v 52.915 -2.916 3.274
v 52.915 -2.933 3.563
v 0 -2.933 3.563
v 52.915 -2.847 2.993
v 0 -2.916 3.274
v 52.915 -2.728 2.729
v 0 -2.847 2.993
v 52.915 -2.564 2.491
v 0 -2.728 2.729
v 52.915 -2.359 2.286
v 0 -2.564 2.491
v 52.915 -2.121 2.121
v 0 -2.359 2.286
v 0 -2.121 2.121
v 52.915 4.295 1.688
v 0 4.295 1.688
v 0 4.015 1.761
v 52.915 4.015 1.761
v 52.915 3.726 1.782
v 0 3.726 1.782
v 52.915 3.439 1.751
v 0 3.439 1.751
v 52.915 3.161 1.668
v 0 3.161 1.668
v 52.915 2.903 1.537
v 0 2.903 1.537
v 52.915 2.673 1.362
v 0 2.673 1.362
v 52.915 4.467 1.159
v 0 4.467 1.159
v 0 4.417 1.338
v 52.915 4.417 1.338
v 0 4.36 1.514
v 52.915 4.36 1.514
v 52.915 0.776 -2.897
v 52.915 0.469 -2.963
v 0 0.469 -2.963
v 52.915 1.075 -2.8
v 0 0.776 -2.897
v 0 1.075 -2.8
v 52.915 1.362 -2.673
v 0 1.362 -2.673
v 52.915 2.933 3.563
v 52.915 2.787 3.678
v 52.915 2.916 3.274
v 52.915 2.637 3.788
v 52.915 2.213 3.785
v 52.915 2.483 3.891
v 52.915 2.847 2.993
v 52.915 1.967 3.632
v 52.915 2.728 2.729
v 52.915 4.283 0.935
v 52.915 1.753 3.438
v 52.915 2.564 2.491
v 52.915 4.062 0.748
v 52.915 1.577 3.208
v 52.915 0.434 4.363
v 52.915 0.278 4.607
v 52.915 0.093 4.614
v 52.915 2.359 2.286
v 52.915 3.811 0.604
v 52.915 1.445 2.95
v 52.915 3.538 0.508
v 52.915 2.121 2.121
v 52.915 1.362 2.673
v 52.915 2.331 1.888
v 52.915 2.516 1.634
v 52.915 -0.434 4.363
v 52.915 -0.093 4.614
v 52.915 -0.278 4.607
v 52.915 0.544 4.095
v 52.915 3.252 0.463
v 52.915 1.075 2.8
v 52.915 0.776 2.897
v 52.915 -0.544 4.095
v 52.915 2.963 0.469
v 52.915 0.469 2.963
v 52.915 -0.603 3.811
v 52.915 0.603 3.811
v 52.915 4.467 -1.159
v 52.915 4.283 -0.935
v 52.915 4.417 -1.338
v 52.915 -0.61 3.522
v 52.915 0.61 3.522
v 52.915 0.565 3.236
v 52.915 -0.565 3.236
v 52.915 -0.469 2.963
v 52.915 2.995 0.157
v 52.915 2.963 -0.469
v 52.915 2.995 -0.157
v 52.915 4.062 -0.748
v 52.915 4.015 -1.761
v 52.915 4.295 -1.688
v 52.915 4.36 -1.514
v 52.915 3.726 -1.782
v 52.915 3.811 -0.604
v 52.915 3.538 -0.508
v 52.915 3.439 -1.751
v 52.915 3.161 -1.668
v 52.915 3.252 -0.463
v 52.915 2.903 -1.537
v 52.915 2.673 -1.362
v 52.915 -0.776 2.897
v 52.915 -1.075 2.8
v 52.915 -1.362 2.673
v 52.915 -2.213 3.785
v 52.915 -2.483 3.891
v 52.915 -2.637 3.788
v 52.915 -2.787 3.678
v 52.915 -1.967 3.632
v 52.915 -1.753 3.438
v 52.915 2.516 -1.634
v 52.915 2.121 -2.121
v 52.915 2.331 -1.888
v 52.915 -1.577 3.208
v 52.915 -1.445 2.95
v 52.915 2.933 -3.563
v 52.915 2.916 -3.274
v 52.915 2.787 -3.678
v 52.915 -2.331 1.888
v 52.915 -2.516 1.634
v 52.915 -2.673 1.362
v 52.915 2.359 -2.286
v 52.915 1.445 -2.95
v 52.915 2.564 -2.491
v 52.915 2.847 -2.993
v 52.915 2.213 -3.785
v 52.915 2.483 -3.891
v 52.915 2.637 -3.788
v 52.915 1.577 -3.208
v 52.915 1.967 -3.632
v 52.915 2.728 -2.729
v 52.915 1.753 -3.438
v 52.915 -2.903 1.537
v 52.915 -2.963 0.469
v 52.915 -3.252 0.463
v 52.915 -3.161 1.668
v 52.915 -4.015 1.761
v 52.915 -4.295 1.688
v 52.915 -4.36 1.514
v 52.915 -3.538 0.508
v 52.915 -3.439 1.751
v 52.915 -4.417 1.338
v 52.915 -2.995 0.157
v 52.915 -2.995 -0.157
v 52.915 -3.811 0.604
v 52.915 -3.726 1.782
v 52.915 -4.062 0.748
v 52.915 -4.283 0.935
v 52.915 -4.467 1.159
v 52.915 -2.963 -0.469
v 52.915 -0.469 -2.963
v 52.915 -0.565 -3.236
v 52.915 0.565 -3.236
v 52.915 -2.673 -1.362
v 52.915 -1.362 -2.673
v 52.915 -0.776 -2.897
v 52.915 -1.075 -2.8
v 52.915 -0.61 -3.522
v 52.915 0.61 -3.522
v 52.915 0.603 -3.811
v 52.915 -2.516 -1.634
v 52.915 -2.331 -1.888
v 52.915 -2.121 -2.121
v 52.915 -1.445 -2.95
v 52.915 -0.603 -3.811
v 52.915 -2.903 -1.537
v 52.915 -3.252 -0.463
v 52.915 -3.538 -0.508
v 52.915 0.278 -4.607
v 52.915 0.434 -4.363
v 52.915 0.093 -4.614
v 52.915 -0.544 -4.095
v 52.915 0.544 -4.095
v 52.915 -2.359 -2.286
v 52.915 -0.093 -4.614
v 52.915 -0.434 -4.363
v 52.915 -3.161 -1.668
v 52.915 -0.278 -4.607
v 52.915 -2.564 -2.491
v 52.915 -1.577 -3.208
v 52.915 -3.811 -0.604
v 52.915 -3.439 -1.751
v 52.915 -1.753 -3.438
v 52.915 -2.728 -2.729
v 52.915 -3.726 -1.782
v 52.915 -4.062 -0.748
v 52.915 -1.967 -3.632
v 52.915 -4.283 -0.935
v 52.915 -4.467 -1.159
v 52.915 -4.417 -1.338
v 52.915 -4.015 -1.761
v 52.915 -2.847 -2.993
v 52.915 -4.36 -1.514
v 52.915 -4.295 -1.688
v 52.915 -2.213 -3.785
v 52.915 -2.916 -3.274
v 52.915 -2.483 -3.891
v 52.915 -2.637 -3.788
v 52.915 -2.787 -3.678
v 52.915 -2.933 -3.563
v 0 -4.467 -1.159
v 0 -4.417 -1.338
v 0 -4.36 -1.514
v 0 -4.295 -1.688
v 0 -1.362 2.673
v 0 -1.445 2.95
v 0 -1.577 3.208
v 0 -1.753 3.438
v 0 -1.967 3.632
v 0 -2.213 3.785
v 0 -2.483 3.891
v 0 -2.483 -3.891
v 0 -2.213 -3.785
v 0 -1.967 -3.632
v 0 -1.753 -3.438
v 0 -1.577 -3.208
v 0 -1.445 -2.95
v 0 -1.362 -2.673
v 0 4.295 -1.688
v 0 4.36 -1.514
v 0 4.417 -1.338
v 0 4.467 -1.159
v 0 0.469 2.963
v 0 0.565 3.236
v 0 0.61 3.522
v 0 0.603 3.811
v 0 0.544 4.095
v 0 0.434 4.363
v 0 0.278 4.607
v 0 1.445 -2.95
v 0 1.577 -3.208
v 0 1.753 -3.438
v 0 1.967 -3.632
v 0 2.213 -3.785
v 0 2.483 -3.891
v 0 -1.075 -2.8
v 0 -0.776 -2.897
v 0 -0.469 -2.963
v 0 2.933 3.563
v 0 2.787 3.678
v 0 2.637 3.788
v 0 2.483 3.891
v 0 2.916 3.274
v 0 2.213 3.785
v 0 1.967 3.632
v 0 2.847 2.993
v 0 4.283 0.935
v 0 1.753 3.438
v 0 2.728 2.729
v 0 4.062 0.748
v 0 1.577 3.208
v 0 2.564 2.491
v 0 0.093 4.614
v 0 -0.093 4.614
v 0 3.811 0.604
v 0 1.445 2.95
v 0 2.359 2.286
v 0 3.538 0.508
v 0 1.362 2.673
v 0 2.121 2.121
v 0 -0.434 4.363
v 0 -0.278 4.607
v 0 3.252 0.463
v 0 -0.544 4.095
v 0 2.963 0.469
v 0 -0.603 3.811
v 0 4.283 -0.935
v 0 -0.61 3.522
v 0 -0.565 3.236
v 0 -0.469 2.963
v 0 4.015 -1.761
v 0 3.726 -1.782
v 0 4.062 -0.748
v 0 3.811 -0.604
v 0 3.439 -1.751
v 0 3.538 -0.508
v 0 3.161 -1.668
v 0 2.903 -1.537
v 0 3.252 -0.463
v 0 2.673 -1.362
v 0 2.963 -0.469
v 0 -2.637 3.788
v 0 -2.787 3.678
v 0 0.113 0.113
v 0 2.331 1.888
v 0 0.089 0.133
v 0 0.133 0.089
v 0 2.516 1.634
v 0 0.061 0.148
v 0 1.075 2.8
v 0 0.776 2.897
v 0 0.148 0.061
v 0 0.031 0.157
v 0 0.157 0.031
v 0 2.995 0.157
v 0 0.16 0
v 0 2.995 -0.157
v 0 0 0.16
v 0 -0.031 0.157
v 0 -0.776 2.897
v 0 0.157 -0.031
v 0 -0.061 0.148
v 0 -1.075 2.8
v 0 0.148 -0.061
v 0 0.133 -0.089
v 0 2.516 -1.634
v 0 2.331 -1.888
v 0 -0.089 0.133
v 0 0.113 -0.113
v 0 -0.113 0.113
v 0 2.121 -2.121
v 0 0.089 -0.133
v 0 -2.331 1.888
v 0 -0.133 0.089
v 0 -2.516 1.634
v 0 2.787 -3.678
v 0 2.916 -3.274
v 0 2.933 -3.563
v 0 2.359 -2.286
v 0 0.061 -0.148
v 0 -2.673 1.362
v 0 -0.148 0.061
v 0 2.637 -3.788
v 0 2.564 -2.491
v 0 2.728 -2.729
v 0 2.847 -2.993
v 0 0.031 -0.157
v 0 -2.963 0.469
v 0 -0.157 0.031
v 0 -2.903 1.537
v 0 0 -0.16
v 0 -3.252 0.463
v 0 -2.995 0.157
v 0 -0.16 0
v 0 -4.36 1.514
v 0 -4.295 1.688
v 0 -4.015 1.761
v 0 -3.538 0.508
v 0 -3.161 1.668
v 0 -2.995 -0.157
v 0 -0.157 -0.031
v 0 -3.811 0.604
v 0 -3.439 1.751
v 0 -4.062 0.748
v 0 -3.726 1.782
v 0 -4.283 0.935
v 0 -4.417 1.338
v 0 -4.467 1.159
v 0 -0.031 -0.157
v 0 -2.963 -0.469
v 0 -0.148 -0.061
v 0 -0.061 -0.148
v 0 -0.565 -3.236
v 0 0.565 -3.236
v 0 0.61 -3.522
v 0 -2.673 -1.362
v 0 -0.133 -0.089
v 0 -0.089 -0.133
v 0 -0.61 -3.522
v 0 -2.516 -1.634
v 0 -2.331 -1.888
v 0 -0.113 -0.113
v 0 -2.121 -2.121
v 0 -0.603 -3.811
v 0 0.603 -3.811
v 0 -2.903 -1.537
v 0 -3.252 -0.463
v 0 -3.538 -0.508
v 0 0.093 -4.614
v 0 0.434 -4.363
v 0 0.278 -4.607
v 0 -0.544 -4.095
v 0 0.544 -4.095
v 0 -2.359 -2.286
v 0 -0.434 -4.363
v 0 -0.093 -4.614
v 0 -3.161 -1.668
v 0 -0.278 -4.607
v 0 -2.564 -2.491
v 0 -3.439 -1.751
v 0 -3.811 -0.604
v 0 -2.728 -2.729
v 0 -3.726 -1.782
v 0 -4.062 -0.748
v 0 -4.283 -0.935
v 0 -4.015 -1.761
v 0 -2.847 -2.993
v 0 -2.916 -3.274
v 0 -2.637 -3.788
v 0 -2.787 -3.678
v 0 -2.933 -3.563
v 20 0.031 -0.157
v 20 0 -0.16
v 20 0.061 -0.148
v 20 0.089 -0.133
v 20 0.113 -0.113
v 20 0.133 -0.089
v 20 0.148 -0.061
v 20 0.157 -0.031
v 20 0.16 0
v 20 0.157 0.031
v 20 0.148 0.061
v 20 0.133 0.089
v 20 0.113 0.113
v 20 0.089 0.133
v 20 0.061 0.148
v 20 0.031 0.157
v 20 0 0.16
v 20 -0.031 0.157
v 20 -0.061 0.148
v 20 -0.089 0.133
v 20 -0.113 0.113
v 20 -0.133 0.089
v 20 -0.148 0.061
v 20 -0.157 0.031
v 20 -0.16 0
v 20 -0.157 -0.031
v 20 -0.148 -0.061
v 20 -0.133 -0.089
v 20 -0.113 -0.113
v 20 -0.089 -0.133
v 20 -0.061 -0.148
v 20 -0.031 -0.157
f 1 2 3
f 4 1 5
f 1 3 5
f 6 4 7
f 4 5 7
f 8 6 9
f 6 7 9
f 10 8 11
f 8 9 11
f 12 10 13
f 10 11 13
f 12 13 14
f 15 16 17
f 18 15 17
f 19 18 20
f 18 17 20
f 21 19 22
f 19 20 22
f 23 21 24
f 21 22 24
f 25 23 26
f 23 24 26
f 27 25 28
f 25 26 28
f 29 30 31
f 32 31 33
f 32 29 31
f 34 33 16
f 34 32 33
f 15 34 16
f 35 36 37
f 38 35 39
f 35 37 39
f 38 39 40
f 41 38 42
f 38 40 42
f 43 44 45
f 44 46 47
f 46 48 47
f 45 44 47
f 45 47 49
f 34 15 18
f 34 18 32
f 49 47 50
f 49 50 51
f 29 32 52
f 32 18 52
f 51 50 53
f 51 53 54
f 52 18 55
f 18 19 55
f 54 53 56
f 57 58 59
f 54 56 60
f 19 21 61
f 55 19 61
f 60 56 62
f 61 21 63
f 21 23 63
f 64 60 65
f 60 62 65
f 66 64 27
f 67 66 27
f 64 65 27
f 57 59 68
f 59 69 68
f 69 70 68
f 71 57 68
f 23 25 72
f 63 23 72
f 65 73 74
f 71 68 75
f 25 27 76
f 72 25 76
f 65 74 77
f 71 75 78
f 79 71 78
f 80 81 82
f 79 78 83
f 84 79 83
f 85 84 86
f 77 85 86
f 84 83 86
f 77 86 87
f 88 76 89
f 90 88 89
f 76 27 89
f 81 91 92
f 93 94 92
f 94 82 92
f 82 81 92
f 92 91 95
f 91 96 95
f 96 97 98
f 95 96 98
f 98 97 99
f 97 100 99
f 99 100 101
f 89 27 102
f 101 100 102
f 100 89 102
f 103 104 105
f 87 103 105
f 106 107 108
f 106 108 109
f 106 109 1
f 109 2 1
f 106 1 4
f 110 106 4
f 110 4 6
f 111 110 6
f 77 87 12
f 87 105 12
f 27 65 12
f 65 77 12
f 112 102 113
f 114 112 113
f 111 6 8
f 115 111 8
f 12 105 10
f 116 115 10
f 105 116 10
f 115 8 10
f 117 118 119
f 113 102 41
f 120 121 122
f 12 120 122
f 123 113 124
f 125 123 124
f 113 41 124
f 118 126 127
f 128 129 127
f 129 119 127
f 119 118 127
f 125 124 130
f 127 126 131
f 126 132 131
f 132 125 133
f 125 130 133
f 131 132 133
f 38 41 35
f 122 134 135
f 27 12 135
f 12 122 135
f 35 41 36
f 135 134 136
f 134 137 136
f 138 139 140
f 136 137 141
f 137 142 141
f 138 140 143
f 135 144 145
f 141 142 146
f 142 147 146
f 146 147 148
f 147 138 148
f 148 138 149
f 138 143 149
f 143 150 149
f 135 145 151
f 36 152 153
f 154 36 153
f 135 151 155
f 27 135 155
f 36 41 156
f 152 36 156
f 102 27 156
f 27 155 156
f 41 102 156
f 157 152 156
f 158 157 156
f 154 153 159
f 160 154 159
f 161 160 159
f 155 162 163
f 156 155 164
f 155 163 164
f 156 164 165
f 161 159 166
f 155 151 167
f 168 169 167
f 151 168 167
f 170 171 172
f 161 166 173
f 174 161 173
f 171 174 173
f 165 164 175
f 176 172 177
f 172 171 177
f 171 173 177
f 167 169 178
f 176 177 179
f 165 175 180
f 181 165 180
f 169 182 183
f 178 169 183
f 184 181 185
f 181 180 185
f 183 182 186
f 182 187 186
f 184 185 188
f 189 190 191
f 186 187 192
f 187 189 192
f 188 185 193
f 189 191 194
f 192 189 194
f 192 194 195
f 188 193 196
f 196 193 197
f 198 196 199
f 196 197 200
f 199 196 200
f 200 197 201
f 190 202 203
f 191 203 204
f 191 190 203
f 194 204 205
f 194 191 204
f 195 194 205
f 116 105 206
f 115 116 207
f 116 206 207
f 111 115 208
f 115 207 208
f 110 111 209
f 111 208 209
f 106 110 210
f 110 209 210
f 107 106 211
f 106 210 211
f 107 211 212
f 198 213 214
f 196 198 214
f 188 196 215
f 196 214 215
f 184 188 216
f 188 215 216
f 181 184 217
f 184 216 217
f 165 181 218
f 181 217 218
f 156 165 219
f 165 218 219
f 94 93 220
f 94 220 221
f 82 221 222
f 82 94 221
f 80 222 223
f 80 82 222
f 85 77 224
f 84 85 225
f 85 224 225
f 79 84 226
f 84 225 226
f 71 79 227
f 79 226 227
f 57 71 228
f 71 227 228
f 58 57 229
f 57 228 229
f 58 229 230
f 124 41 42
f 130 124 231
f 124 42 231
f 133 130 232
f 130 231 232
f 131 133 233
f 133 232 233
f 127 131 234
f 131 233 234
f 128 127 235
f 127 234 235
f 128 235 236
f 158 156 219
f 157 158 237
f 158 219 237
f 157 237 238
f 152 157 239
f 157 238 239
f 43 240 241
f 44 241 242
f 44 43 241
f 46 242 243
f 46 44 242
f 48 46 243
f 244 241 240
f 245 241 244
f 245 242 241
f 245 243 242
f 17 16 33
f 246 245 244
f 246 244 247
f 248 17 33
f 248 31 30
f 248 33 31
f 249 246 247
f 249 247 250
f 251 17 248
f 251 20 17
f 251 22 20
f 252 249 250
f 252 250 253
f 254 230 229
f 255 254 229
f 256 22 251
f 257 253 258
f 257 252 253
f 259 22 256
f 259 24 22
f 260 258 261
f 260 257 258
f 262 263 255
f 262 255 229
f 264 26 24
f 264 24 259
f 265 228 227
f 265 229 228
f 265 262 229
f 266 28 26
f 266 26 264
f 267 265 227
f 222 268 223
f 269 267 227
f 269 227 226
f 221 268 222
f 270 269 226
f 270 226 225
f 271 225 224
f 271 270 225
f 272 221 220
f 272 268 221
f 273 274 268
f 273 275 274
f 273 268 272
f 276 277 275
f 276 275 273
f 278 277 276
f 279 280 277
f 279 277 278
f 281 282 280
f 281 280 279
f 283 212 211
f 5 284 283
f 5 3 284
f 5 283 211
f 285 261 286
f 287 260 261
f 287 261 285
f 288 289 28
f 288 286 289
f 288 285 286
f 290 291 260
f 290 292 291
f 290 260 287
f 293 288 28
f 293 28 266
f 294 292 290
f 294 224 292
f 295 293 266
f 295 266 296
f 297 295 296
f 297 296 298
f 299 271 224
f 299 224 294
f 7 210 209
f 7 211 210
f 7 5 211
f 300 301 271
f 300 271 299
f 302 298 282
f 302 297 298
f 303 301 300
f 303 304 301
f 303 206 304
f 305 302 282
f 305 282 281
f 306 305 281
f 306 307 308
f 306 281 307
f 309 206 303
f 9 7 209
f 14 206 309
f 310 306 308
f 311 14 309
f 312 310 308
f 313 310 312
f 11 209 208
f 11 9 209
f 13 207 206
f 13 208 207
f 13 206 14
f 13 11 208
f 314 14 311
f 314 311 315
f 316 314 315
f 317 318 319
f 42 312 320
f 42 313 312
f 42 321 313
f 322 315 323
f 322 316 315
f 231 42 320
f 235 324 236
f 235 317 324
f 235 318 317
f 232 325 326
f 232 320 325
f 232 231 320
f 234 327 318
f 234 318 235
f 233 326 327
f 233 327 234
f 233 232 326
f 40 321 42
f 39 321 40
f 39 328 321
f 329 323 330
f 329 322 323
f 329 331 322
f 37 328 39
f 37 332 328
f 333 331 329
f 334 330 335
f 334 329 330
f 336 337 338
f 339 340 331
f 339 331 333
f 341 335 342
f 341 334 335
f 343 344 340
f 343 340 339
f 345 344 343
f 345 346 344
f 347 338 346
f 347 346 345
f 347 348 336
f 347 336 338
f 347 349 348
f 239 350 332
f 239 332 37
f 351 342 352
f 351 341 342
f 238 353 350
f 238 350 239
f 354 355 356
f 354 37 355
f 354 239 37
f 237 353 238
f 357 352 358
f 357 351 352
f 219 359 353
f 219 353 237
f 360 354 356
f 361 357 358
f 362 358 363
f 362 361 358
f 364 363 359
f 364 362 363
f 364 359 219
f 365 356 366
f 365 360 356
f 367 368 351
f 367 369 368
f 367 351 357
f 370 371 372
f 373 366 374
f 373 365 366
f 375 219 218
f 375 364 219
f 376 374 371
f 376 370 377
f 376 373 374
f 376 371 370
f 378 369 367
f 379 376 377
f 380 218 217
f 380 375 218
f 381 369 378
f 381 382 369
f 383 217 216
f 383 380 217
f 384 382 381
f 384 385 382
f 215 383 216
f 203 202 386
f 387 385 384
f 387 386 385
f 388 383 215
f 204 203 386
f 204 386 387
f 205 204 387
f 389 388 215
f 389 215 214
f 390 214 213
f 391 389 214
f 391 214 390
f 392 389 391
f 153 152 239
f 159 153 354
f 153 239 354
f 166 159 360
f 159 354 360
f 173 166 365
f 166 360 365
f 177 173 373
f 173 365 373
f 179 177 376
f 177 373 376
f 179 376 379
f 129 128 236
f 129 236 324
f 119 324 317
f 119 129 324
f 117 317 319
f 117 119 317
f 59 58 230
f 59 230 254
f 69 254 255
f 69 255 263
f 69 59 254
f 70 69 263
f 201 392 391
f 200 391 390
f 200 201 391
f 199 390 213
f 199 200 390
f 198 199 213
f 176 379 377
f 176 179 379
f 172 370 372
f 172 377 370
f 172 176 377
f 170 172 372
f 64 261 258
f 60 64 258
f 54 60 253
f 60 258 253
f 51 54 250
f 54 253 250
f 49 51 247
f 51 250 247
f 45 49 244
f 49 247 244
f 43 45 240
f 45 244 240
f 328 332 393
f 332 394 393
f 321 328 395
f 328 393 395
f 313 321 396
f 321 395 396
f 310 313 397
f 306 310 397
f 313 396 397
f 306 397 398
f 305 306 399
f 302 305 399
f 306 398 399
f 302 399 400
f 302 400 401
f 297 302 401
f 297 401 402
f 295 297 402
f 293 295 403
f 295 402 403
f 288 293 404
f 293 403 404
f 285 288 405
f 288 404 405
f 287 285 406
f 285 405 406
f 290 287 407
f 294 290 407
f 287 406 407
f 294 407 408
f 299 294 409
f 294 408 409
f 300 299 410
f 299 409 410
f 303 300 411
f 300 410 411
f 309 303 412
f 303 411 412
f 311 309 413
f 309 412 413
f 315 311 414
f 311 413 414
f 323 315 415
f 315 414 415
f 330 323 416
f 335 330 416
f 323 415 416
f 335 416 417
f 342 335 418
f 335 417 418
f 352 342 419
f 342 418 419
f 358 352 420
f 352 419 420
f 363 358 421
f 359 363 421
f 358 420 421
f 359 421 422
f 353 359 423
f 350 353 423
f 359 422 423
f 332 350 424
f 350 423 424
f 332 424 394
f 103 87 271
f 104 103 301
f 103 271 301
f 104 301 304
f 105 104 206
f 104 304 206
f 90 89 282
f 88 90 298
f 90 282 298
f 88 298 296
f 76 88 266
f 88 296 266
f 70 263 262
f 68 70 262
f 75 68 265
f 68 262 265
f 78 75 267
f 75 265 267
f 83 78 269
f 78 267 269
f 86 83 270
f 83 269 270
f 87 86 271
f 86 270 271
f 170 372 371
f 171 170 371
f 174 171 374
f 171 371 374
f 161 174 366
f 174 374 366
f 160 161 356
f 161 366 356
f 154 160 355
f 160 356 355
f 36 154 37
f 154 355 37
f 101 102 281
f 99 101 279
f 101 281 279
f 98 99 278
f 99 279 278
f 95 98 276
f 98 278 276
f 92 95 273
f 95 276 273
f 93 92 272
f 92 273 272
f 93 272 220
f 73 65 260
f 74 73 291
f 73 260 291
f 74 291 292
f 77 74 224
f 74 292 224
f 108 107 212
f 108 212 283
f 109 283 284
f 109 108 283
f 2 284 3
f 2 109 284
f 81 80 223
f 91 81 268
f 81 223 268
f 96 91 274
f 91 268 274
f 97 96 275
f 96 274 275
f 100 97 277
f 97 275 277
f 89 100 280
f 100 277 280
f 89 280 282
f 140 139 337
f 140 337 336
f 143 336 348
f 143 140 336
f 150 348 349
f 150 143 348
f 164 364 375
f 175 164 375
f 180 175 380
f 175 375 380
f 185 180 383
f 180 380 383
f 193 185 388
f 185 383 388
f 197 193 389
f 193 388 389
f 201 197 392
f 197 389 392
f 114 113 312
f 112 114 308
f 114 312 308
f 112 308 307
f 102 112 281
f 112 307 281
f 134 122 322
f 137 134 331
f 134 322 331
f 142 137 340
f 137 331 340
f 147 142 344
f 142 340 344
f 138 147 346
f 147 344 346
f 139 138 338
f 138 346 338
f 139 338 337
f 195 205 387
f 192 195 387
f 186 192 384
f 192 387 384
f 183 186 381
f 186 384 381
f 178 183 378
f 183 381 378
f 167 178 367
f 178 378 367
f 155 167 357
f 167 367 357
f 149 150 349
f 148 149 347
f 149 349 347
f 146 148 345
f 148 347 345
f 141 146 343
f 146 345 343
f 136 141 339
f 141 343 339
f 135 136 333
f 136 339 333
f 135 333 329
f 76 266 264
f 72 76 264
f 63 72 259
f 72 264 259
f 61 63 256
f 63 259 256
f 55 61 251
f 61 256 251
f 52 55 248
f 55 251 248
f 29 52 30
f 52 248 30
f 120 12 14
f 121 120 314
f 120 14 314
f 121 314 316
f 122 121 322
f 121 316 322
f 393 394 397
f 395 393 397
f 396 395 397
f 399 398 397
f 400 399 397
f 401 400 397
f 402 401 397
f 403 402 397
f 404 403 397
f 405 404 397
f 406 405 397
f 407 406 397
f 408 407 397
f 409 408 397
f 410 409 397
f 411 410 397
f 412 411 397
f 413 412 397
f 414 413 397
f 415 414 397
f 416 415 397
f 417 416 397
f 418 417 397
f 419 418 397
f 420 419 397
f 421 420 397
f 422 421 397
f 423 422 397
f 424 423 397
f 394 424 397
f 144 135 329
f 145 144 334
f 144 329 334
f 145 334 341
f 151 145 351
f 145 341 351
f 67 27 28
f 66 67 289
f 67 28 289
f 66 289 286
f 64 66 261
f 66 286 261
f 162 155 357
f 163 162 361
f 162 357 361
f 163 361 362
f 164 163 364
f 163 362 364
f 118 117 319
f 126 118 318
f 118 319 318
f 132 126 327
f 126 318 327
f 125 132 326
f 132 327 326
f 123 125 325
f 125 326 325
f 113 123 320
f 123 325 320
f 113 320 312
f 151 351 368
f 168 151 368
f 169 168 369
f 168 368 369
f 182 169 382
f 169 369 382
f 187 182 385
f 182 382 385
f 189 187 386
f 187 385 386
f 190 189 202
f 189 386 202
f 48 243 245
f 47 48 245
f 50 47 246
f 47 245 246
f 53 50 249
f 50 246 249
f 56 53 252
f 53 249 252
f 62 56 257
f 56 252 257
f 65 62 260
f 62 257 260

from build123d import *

# Parameters (mm, degrees)
BASPROSKE_W        = 132.288
BASPROSKE_H        = 12
TOOTHCUT_DEPTH     = 134.372092073
TEETHCUTS_COUNT    = 10
TEETHCUTS_ANGLE    = 324
BORSKE_R           = 0.4
BORE_DEPTH         = 50.0000508
SKETCH1_R          = 15.199839534
SKETCH1_R_2        = 11.537985571
CUT_EXTRUDE1_DEPTH = 134.327124963
SCALE1_SCALE       = 0.4


with BuildPart() as part:
    # BasProSke → Base-Revolve (revolve)
    with BuildSketch(Plane(origin=(0, 0, 0), x_dir=(1, 0, 0), z_dir=(0, 1, 0)), mode=Mode.PRIVATE) as base_revolve_sk:
        with Locations((66.144, 6)):
            Rectangle(BASPROSKE_W, BASPROSKE_H)
    revolve(base_revolve_sk.sketch.rotate(Axis((-10, 0, 0), (1, 0, 0)), 180), axis=Axis((-10, 0, 0), (1, 0, 0)))

    # TooCutSke → ToothCut (cut, through all)
    with BuildSketch(Plane(origin=(0, 0, 0), x_dir=(0, 0, -1), z_dir=(1, 0, 0))):
        with BuildLine():
            ThreePointArc((1.173662691, 7.406586048), (0, 7.499), (-1.173662691, 7.406586048))
            ThreePointArc((-1.173662691, 7.406586048), (-1.668191438, 9.834565786), (-3.497907776, 11.50542856))
            ThreePointArc((-3.497907776, 11.50542856), (0, 12.0254), (3.497907776, 11.50542856))
            ThreePointArc((3.497907776, 11.50542856), (1.668191438, 9.834565786), (1.173662691, 7.406586048))
        make_face()
    toothcut = extrude(amount=TOOTHCUT_DEPTH, mode=Mode.SUBTRACT)

    # TeethCuts: ToothCut ×10 about axis
    teethcuts_axis = Axis((-10, 0, 0), (1, 0, 0))
    for i in range(1, TEETHCUTS_COUNT):
        add(toothcut.rotate(teethcuts_axis, i * TEETHCUTS_ANGLE / (TEETHCUTS_COUNT - 1)), mode=Mode.SUBTRACT)

    # BorSke → Bore (cut, symmetric)
    with BuildSketch(Plane(origin=(0, 0, 0), x_dir=(0, 0, -1), z_dir=(1, 0, 0))):
        Circle(BORSKE_R)
    extrude(amount=BORE_DEPTH, both=True, mode=Mode.SUBTRACT)

    # Sketch1 → Cut-Extrude1 (cut, through all)
    with BuildSketch(Plane(origin=(132.288, 0, 0), x_dir=(0, 0, -1), z_dir=(1, 0, 0))):
        Circle(SKETCH1_R)
        Circle(SKETCH1_R_2, mode=Mode.SUBTRACT)
    extrude(amount=-CUT_EXTRUDE1_DEPTH, mode=Mode.SUBTRACT)


with BuildPart() as part_1:
    # Scale1: scaled about (0, 0, 0)
    add(part.part.scale(SCALE1_SCALE))


solid = part_1.part
